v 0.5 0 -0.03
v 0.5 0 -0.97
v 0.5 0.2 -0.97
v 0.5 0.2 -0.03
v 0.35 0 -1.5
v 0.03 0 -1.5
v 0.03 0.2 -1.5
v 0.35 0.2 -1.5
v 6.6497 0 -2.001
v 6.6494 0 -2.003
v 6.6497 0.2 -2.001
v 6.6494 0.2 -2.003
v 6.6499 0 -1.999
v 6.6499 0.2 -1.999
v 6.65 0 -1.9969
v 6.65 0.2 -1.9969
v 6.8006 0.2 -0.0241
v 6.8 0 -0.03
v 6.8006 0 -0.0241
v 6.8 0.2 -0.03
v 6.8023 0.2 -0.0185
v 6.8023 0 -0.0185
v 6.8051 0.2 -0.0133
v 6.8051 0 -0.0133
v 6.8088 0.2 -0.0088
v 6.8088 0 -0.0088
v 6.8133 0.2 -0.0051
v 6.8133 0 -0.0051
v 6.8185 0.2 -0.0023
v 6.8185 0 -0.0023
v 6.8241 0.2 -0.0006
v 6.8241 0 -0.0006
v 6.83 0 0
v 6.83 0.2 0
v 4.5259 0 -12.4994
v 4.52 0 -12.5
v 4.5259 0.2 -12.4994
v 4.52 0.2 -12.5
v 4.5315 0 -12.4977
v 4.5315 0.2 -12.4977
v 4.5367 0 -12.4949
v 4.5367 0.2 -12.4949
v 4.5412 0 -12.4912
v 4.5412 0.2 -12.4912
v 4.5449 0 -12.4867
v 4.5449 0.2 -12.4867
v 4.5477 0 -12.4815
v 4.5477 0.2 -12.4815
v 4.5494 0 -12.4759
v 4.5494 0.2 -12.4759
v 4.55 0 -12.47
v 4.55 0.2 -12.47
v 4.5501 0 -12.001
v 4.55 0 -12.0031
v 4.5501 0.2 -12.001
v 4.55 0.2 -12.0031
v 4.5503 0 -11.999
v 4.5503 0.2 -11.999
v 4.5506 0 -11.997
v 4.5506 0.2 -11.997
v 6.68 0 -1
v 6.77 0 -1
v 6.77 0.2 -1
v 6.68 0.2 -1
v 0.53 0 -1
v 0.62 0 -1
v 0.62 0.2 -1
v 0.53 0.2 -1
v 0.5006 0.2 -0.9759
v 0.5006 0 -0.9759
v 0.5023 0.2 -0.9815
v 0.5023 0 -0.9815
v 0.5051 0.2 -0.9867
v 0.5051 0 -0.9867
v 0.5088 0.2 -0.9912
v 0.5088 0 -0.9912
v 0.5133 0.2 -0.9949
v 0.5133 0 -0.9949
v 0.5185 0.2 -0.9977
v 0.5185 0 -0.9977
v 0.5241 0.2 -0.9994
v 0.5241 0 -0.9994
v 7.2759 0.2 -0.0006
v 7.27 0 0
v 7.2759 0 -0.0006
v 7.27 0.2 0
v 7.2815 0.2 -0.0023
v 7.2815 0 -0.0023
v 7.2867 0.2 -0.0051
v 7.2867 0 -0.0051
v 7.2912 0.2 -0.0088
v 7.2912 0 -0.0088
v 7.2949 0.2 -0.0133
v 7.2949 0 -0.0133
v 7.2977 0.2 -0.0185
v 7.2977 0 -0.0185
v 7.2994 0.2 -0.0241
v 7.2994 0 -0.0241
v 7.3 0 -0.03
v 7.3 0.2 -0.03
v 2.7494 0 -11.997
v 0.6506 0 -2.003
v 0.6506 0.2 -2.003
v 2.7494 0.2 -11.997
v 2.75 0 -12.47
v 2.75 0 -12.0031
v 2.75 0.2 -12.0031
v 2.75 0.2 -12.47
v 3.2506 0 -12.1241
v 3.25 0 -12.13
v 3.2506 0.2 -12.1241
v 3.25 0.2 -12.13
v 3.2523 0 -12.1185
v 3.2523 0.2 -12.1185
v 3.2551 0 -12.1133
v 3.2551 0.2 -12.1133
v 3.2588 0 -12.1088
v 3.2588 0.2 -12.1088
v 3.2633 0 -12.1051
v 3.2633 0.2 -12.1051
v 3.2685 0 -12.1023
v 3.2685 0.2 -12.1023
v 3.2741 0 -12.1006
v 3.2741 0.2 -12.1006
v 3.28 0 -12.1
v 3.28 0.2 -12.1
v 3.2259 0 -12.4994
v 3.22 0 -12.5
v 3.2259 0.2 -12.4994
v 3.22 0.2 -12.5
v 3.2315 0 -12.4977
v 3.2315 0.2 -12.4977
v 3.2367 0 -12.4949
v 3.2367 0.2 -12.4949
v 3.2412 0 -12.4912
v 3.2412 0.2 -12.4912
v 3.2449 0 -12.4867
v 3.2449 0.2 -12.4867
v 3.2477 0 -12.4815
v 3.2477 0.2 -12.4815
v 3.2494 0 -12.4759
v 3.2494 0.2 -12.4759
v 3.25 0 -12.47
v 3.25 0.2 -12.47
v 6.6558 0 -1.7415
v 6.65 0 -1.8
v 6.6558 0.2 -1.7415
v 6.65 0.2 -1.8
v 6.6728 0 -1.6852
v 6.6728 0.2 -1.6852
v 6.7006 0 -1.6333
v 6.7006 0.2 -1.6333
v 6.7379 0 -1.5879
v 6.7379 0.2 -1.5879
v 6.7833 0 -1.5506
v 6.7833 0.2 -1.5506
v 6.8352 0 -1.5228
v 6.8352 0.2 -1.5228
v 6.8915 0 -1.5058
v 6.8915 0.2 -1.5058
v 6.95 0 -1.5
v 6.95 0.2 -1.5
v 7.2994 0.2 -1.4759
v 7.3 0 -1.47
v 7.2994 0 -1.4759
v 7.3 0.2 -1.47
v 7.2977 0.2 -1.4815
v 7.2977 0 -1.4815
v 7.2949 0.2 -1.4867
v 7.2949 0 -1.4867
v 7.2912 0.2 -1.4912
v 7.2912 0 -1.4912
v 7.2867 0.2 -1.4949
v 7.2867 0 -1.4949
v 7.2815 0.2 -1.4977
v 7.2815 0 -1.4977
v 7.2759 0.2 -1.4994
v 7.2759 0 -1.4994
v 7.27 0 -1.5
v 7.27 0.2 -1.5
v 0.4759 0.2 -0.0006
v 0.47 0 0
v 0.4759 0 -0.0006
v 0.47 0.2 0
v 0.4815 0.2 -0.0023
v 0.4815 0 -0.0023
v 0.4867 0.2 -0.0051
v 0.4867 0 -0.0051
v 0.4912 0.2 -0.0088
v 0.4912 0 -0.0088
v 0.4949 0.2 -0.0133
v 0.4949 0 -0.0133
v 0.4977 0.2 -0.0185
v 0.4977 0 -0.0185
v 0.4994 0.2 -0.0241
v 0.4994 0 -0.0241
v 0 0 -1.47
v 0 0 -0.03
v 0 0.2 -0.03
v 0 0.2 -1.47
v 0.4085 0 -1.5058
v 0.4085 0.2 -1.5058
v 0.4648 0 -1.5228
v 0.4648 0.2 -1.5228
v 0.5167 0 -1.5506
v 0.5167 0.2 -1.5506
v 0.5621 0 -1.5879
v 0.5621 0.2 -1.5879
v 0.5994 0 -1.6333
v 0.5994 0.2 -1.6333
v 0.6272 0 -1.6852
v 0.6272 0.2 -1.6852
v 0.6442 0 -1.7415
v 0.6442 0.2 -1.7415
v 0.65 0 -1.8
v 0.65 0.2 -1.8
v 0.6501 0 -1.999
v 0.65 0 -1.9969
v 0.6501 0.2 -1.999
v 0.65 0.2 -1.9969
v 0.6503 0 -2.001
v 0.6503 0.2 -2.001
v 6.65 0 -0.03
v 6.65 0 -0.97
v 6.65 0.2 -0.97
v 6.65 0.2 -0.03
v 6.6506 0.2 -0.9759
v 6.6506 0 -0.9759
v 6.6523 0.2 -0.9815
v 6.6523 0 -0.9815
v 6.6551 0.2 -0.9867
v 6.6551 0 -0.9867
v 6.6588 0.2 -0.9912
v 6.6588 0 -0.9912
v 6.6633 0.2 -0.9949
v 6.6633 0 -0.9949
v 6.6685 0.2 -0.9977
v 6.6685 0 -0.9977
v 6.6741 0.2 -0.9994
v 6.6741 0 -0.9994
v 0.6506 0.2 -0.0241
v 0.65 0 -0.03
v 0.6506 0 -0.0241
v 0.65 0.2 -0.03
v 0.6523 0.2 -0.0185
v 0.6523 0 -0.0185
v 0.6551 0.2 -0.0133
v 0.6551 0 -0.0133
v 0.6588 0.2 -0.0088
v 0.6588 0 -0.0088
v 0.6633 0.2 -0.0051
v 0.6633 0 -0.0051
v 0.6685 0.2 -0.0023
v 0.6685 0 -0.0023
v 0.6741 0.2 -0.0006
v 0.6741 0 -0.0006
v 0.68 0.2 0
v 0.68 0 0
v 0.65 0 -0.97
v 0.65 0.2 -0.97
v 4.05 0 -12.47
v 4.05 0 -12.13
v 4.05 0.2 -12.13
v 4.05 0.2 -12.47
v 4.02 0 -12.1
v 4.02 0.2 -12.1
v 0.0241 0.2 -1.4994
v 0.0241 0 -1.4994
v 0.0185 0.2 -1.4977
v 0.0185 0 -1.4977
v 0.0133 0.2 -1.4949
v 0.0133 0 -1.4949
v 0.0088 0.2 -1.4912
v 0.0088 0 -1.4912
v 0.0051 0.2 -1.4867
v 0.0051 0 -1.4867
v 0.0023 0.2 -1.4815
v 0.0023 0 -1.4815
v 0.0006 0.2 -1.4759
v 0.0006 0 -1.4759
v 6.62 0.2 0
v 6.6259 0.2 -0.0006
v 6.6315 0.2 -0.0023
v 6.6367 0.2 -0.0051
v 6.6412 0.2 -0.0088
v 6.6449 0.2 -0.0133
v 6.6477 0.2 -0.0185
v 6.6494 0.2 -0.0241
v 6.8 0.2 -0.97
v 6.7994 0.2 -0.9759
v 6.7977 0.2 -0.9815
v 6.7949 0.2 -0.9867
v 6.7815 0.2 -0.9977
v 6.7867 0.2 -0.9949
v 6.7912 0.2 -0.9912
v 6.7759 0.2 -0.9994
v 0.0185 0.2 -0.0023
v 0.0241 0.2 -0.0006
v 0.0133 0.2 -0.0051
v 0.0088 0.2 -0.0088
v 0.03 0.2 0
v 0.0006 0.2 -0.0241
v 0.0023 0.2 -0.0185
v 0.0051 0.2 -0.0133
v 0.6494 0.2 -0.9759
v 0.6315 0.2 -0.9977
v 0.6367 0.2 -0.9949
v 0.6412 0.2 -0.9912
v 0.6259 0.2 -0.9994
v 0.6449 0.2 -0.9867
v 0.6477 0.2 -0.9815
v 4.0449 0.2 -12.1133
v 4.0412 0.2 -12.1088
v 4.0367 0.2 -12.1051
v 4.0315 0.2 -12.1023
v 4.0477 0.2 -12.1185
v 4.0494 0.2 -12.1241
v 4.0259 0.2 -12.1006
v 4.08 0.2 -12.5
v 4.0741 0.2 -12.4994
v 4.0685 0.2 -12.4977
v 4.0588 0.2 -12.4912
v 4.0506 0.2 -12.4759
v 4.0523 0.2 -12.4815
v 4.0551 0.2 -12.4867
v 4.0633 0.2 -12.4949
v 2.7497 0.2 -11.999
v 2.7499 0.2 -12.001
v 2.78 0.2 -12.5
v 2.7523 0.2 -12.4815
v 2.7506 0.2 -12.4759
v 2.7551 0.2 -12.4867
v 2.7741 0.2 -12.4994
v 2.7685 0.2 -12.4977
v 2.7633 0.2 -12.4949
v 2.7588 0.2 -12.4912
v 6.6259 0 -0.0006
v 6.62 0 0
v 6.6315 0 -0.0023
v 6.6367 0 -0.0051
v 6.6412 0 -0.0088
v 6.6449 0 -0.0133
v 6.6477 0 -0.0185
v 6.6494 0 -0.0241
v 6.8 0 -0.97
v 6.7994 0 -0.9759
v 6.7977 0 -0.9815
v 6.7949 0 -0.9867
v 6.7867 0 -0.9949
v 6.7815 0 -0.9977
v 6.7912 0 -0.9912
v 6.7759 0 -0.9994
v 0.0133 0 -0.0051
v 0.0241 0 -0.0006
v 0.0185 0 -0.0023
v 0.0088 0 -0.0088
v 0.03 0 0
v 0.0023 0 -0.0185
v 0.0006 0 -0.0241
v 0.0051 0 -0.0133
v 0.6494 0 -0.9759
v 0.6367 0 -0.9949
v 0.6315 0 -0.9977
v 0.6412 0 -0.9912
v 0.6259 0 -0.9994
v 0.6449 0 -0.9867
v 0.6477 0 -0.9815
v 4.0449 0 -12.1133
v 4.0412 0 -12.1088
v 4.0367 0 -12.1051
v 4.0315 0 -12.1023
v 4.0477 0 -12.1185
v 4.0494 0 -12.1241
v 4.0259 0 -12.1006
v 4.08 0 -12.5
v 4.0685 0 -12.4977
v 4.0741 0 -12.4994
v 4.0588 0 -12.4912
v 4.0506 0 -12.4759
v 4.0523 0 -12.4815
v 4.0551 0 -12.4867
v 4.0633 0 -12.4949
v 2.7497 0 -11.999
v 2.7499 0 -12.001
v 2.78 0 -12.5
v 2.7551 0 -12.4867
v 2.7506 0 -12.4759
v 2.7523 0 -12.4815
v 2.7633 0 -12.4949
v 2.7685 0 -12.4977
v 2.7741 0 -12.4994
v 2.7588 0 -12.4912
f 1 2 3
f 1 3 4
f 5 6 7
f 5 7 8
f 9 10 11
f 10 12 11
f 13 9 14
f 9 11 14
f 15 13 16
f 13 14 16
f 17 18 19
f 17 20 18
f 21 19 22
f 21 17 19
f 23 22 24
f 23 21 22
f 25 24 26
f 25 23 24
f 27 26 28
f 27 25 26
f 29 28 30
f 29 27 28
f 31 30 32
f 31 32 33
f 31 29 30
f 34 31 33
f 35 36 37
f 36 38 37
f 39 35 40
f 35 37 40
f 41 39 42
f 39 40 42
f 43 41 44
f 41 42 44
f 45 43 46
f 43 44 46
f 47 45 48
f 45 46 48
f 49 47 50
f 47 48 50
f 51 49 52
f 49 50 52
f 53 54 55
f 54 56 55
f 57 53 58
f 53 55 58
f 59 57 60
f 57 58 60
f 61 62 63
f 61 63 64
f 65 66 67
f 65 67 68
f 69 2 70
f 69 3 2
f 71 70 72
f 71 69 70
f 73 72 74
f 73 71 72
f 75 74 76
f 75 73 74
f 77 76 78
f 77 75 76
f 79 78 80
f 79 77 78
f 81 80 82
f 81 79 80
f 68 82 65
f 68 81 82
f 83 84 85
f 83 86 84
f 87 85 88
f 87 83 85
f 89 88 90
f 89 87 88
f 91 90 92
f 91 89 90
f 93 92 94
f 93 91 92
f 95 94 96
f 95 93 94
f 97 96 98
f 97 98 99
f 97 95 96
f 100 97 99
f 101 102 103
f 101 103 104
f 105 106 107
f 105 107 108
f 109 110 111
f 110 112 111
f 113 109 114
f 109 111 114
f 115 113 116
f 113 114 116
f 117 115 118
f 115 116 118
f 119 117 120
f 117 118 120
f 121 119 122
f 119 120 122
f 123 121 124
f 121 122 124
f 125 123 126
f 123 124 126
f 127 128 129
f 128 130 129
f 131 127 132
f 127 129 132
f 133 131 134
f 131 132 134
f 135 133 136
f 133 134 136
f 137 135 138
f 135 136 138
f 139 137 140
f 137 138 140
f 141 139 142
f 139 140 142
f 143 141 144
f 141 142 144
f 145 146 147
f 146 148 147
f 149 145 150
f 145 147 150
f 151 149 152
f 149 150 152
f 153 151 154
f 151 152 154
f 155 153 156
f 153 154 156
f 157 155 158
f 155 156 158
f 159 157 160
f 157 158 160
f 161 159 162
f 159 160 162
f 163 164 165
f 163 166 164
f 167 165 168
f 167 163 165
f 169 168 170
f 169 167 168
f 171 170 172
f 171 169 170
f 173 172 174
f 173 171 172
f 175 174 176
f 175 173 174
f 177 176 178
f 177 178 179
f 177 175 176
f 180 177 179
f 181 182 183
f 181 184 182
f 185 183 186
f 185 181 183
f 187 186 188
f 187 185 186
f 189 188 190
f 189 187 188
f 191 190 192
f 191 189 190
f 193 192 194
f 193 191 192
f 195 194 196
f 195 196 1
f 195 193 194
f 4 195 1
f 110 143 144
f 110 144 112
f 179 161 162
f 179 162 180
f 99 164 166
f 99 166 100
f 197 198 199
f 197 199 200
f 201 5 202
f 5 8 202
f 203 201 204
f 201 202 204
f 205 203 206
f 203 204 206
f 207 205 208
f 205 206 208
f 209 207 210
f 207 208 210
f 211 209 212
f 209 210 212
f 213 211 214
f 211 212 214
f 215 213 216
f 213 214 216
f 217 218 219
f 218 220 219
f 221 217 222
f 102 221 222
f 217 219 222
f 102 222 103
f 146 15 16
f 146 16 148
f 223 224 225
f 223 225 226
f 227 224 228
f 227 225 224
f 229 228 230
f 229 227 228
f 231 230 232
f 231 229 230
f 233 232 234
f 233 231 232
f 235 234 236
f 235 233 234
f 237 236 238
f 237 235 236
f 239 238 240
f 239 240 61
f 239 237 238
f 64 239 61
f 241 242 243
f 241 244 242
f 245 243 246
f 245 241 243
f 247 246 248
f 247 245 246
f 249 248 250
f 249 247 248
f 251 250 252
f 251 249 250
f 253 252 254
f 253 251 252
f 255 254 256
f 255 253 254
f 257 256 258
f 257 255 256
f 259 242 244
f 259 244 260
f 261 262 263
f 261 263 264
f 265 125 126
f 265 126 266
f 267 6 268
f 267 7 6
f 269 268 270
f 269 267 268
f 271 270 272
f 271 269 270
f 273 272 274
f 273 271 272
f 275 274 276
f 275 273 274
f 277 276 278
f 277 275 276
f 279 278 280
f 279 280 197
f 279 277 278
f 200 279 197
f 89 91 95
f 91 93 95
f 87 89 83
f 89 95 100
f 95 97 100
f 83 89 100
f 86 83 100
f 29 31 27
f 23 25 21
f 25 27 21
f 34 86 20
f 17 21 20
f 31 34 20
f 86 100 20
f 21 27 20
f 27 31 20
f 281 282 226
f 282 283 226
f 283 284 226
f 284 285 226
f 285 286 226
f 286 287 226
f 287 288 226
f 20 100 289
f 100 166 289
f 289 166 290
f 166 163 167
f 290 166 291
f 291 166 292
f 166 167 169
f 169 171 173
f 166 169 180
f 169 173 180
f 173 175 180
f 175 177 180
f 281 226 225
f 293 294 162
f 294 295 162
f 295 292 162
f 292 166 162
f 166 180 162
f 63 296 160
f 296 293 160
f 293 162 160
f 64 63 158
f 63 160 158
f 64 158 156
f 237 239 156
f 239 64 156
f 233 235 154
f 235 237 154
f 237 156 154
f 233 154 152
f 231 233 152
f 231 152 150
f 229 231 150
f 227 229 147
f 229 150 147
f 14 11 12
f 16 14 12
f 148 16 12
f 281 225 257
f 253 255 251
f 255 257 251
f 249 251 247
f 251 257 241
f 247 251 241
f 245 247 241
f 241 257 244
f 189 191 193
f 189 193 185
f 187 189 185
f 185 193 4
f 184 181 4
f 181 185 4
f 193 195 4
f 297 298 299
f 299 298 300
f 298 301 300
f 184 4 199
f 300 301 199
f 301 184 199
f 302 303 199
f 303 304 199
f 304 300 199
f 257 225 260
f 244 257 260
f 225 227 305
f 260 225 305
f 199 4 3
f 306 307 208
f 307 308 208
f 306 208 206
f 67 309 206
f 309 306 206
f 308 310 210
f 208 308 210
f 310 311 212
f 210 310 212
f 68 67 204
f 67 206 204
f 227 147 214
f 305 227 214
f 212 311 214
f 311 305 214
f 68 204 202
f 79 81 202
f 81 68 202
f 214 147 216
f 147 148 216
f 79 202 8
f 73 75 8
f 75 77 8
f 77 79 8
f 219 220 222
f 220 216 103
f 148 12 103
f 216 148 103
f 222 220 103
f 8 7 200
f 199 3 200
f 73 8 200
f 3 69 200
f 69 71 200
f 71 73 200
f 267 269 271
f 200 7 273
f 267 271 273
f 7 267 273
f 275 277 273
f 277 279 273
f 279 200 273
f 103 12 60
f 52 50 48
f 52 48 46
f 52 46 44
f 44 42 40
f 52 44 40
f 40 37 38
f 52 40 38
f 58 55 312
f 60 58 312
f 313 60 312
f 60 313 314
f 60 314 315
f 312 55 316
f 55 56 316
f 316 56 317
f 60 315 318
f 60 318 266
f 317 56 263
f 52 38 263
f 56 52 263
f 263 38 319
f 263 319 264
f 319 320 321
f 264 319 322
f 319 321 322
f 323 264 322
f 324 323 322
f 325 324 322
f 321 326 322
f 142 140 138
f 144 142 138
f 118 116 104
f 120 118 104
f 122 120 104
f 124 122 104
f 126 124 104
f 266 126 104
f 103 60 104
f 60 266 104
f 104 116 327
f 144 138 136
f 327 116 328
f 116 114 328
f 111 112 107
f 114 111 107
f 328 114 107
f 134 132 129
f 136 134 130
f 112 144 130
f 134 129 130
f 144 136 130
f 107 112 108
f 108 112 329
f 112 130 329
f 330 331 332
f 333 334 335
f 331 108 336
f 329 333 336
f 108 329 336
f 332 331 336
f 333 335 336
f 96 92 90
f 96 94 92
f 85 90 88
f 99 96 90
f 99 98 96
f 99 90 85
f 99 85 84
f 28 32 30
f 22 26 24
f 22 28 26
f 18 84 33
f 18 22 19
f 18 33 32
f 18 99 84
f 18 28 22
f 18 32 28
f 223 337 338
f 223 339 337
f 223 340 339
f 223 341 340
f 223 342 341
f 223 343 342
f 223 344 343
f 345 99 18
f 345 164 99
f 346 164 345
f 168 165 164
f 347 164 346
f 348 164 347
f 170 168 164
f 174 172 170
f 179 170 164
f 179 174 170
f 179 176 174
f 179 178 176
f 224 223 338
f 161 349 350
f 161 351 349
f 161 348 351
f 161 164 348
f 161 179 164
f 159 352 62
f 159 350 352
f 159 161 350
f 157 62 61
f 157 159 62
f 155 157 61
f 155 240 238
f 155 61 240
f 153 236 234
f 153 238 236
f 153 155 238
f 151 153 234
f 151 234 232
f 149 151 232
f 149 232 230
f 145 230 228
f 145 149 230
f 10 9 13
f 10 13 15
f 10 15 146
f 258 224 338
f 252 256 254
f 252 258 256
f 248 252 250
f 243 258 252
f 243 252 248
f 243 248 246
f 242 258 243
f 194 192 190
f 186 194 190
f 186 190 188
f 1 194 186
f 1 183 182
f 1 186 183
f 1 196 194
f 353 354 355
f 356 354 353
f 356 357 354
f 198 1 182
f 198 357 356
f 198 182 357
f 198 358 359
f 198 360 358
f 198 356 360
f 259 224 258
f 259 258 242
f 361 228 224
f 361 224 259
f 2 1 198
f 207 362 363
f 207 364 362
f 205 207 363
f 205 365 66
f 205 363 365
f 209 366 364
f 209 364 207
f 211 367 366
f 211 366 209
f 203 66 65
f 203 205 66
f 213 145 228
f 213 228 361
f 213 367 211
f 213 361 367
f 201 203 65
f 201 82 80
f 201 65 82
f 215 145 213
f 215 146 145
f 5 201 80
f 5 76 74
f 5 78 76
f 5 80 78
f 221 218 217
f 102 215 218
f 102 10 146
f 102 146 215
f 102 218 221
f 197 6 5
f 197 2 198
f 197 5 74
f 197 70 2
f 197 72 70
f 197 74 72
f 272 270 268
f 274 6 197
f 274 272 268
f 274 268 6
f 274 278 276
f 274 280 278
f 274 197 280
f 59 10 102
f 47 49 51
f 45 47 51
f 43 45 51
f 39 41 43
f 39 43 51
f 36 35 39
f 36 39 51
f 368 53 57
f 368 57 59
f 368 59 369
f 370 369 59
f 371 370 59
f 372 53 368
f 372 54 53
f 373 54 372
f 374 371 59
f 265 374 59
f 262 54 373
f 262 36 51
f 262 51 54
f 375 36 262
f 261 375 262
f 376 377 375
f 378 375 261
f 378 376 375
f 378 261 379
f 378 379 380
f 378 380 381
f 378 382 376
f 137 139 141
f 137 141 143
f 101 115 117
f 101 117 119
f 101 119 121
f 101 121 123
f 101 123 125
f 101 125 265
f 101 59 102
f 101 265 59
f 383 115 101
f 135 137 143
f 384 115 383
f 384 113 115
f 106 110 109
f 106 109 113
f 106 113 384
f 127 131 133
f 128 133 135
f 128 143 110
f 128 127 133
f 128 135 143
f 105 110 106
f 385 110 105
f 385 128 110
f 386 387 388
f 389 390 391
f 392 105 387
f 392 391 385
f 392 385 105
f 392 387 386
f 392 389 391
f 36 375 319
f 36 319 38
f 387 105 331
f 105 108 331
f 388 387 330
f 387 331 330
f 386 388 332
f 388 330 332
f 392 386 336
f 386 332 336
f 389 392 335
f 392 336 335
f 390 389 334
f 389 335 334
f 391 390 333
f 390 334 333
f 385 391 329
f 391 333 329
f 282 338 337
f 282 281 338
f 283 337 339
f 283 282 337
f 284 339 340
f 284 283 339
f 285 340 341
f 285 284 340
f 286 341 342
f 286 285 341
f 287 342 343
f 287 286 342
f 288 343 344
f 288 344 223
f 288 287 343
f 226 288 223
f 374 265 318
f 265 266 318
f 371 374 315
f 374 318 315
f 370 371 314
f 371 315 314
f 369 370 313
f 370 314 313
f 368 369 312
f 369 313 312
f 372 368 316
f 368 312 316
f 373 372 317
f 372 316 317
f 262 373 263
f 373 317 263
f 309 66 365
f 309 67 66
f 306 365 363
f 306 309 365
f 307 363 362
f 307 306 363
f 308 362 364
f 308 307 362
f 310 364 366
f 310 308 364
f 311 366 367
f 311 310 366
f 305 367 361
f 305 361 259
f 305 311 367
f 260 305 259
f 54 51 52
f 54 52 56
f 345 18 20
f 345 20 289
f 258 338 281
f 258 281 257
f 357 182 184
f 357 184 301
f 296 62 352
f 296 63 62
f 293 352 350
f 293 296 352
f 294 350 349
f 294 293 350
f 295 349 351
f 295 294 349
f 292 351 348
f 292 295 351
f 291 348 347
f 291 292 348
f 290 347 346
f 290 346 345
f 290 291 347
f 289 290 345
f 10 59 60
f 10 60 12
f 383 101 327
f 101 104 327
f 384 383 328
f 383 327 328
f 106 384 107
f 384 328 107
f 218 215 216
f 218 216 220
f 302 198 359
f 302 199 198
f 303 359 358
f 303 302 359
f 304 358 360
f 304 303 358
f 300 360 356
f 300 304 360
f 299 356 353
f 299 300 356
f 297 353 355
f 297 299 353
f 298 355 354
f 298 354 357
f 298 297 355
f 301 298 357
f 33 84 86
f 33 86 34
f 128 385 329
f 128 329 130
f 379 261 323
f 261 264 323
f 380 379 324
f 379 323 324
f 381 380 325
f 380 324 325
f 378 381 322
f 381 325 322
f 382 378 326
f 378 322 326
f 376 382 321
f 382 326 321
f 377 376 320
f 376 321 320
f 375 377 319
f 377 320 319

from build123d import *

# Parameters (mm, degrees)
BOSS_EXTRUDE1_DEPTH = 0.2
FILLET1_R           = 0.3
FILLET2_R           = 0.03


with BuildPart() as part:
    # Sketch1 → Boss-Extrude1 (new body)
    with BuildSketch(Plane(origin=(0, 0, 0), x_dir=(1, 0, 0), z_dir=(0, 1, 0))):
        Polygon((0, 0), (0, 1.5), (0.65, 1.5), (0.65, 2), (2.75, 12), (2.75, 12.5), (3.25, 12.5), (3.25, 12.1), (4.05, 12.1), (4.05, 12.5), (4.55, 12.5), (4.55, 12), (6.65, 2), (6.65, 1.5), (7.3, 1.5), (7.3, 0), (6.8, 0), (6.8, 1), (6.65, 1), (6.65, 0), (0.65, 0), (0.65, 1), (0.5, 1), (0.5, 0), align=None)
    extrude(amount=BOSS_EXTRUDE1_DEPTH)

    # Fillet1
    fillet1_edges = [part.edges().sort_by_distance(p)[0] for p in [
        (0.65, 0.1, -1.5),
        (6.65, 0.1, -1.5),
    ]]
    fillet(fillet1_edges, radius=FILLET1_R)

    # Fillet2
    fillet2_edges = [part.edges().sort_by_distance(p)[0] for p in [
        (0, 0.1, 0),
        (0, 0.1, -1.5),
        (0.65, 0.1, -2),
        (2.75, 0.1, -12),
        (2.75, 0.1, -12.5),
        (3.25, 0.1, -12.5),
        (3.25, 0.1, -12.1),
        (4.05, 0.1, -12.1),
        (4.05, 0.1, -12.5),
        (4.55, 0.1, -12.5),
        (4.55, 0.1, -12),
        (6.65, 0.1, -2),
        (7.3, 0.1, -1.5),
        (7.3, 0.1, 0),
        (6.8, 0.1, 0),
        (6.8, 0.1, -1),
        (6.65, 0.1, -1),
        (6.65, 0.1, 0),
        (0.65, 0.1, 0),
        (0.65, 0.1, -1),
        (0.5, 0.1, -1),
        (0.5, 0.1, 0),
    ]]
    fillet(fillet2_edges, radius=FILLET2_R)


solid = part.part
